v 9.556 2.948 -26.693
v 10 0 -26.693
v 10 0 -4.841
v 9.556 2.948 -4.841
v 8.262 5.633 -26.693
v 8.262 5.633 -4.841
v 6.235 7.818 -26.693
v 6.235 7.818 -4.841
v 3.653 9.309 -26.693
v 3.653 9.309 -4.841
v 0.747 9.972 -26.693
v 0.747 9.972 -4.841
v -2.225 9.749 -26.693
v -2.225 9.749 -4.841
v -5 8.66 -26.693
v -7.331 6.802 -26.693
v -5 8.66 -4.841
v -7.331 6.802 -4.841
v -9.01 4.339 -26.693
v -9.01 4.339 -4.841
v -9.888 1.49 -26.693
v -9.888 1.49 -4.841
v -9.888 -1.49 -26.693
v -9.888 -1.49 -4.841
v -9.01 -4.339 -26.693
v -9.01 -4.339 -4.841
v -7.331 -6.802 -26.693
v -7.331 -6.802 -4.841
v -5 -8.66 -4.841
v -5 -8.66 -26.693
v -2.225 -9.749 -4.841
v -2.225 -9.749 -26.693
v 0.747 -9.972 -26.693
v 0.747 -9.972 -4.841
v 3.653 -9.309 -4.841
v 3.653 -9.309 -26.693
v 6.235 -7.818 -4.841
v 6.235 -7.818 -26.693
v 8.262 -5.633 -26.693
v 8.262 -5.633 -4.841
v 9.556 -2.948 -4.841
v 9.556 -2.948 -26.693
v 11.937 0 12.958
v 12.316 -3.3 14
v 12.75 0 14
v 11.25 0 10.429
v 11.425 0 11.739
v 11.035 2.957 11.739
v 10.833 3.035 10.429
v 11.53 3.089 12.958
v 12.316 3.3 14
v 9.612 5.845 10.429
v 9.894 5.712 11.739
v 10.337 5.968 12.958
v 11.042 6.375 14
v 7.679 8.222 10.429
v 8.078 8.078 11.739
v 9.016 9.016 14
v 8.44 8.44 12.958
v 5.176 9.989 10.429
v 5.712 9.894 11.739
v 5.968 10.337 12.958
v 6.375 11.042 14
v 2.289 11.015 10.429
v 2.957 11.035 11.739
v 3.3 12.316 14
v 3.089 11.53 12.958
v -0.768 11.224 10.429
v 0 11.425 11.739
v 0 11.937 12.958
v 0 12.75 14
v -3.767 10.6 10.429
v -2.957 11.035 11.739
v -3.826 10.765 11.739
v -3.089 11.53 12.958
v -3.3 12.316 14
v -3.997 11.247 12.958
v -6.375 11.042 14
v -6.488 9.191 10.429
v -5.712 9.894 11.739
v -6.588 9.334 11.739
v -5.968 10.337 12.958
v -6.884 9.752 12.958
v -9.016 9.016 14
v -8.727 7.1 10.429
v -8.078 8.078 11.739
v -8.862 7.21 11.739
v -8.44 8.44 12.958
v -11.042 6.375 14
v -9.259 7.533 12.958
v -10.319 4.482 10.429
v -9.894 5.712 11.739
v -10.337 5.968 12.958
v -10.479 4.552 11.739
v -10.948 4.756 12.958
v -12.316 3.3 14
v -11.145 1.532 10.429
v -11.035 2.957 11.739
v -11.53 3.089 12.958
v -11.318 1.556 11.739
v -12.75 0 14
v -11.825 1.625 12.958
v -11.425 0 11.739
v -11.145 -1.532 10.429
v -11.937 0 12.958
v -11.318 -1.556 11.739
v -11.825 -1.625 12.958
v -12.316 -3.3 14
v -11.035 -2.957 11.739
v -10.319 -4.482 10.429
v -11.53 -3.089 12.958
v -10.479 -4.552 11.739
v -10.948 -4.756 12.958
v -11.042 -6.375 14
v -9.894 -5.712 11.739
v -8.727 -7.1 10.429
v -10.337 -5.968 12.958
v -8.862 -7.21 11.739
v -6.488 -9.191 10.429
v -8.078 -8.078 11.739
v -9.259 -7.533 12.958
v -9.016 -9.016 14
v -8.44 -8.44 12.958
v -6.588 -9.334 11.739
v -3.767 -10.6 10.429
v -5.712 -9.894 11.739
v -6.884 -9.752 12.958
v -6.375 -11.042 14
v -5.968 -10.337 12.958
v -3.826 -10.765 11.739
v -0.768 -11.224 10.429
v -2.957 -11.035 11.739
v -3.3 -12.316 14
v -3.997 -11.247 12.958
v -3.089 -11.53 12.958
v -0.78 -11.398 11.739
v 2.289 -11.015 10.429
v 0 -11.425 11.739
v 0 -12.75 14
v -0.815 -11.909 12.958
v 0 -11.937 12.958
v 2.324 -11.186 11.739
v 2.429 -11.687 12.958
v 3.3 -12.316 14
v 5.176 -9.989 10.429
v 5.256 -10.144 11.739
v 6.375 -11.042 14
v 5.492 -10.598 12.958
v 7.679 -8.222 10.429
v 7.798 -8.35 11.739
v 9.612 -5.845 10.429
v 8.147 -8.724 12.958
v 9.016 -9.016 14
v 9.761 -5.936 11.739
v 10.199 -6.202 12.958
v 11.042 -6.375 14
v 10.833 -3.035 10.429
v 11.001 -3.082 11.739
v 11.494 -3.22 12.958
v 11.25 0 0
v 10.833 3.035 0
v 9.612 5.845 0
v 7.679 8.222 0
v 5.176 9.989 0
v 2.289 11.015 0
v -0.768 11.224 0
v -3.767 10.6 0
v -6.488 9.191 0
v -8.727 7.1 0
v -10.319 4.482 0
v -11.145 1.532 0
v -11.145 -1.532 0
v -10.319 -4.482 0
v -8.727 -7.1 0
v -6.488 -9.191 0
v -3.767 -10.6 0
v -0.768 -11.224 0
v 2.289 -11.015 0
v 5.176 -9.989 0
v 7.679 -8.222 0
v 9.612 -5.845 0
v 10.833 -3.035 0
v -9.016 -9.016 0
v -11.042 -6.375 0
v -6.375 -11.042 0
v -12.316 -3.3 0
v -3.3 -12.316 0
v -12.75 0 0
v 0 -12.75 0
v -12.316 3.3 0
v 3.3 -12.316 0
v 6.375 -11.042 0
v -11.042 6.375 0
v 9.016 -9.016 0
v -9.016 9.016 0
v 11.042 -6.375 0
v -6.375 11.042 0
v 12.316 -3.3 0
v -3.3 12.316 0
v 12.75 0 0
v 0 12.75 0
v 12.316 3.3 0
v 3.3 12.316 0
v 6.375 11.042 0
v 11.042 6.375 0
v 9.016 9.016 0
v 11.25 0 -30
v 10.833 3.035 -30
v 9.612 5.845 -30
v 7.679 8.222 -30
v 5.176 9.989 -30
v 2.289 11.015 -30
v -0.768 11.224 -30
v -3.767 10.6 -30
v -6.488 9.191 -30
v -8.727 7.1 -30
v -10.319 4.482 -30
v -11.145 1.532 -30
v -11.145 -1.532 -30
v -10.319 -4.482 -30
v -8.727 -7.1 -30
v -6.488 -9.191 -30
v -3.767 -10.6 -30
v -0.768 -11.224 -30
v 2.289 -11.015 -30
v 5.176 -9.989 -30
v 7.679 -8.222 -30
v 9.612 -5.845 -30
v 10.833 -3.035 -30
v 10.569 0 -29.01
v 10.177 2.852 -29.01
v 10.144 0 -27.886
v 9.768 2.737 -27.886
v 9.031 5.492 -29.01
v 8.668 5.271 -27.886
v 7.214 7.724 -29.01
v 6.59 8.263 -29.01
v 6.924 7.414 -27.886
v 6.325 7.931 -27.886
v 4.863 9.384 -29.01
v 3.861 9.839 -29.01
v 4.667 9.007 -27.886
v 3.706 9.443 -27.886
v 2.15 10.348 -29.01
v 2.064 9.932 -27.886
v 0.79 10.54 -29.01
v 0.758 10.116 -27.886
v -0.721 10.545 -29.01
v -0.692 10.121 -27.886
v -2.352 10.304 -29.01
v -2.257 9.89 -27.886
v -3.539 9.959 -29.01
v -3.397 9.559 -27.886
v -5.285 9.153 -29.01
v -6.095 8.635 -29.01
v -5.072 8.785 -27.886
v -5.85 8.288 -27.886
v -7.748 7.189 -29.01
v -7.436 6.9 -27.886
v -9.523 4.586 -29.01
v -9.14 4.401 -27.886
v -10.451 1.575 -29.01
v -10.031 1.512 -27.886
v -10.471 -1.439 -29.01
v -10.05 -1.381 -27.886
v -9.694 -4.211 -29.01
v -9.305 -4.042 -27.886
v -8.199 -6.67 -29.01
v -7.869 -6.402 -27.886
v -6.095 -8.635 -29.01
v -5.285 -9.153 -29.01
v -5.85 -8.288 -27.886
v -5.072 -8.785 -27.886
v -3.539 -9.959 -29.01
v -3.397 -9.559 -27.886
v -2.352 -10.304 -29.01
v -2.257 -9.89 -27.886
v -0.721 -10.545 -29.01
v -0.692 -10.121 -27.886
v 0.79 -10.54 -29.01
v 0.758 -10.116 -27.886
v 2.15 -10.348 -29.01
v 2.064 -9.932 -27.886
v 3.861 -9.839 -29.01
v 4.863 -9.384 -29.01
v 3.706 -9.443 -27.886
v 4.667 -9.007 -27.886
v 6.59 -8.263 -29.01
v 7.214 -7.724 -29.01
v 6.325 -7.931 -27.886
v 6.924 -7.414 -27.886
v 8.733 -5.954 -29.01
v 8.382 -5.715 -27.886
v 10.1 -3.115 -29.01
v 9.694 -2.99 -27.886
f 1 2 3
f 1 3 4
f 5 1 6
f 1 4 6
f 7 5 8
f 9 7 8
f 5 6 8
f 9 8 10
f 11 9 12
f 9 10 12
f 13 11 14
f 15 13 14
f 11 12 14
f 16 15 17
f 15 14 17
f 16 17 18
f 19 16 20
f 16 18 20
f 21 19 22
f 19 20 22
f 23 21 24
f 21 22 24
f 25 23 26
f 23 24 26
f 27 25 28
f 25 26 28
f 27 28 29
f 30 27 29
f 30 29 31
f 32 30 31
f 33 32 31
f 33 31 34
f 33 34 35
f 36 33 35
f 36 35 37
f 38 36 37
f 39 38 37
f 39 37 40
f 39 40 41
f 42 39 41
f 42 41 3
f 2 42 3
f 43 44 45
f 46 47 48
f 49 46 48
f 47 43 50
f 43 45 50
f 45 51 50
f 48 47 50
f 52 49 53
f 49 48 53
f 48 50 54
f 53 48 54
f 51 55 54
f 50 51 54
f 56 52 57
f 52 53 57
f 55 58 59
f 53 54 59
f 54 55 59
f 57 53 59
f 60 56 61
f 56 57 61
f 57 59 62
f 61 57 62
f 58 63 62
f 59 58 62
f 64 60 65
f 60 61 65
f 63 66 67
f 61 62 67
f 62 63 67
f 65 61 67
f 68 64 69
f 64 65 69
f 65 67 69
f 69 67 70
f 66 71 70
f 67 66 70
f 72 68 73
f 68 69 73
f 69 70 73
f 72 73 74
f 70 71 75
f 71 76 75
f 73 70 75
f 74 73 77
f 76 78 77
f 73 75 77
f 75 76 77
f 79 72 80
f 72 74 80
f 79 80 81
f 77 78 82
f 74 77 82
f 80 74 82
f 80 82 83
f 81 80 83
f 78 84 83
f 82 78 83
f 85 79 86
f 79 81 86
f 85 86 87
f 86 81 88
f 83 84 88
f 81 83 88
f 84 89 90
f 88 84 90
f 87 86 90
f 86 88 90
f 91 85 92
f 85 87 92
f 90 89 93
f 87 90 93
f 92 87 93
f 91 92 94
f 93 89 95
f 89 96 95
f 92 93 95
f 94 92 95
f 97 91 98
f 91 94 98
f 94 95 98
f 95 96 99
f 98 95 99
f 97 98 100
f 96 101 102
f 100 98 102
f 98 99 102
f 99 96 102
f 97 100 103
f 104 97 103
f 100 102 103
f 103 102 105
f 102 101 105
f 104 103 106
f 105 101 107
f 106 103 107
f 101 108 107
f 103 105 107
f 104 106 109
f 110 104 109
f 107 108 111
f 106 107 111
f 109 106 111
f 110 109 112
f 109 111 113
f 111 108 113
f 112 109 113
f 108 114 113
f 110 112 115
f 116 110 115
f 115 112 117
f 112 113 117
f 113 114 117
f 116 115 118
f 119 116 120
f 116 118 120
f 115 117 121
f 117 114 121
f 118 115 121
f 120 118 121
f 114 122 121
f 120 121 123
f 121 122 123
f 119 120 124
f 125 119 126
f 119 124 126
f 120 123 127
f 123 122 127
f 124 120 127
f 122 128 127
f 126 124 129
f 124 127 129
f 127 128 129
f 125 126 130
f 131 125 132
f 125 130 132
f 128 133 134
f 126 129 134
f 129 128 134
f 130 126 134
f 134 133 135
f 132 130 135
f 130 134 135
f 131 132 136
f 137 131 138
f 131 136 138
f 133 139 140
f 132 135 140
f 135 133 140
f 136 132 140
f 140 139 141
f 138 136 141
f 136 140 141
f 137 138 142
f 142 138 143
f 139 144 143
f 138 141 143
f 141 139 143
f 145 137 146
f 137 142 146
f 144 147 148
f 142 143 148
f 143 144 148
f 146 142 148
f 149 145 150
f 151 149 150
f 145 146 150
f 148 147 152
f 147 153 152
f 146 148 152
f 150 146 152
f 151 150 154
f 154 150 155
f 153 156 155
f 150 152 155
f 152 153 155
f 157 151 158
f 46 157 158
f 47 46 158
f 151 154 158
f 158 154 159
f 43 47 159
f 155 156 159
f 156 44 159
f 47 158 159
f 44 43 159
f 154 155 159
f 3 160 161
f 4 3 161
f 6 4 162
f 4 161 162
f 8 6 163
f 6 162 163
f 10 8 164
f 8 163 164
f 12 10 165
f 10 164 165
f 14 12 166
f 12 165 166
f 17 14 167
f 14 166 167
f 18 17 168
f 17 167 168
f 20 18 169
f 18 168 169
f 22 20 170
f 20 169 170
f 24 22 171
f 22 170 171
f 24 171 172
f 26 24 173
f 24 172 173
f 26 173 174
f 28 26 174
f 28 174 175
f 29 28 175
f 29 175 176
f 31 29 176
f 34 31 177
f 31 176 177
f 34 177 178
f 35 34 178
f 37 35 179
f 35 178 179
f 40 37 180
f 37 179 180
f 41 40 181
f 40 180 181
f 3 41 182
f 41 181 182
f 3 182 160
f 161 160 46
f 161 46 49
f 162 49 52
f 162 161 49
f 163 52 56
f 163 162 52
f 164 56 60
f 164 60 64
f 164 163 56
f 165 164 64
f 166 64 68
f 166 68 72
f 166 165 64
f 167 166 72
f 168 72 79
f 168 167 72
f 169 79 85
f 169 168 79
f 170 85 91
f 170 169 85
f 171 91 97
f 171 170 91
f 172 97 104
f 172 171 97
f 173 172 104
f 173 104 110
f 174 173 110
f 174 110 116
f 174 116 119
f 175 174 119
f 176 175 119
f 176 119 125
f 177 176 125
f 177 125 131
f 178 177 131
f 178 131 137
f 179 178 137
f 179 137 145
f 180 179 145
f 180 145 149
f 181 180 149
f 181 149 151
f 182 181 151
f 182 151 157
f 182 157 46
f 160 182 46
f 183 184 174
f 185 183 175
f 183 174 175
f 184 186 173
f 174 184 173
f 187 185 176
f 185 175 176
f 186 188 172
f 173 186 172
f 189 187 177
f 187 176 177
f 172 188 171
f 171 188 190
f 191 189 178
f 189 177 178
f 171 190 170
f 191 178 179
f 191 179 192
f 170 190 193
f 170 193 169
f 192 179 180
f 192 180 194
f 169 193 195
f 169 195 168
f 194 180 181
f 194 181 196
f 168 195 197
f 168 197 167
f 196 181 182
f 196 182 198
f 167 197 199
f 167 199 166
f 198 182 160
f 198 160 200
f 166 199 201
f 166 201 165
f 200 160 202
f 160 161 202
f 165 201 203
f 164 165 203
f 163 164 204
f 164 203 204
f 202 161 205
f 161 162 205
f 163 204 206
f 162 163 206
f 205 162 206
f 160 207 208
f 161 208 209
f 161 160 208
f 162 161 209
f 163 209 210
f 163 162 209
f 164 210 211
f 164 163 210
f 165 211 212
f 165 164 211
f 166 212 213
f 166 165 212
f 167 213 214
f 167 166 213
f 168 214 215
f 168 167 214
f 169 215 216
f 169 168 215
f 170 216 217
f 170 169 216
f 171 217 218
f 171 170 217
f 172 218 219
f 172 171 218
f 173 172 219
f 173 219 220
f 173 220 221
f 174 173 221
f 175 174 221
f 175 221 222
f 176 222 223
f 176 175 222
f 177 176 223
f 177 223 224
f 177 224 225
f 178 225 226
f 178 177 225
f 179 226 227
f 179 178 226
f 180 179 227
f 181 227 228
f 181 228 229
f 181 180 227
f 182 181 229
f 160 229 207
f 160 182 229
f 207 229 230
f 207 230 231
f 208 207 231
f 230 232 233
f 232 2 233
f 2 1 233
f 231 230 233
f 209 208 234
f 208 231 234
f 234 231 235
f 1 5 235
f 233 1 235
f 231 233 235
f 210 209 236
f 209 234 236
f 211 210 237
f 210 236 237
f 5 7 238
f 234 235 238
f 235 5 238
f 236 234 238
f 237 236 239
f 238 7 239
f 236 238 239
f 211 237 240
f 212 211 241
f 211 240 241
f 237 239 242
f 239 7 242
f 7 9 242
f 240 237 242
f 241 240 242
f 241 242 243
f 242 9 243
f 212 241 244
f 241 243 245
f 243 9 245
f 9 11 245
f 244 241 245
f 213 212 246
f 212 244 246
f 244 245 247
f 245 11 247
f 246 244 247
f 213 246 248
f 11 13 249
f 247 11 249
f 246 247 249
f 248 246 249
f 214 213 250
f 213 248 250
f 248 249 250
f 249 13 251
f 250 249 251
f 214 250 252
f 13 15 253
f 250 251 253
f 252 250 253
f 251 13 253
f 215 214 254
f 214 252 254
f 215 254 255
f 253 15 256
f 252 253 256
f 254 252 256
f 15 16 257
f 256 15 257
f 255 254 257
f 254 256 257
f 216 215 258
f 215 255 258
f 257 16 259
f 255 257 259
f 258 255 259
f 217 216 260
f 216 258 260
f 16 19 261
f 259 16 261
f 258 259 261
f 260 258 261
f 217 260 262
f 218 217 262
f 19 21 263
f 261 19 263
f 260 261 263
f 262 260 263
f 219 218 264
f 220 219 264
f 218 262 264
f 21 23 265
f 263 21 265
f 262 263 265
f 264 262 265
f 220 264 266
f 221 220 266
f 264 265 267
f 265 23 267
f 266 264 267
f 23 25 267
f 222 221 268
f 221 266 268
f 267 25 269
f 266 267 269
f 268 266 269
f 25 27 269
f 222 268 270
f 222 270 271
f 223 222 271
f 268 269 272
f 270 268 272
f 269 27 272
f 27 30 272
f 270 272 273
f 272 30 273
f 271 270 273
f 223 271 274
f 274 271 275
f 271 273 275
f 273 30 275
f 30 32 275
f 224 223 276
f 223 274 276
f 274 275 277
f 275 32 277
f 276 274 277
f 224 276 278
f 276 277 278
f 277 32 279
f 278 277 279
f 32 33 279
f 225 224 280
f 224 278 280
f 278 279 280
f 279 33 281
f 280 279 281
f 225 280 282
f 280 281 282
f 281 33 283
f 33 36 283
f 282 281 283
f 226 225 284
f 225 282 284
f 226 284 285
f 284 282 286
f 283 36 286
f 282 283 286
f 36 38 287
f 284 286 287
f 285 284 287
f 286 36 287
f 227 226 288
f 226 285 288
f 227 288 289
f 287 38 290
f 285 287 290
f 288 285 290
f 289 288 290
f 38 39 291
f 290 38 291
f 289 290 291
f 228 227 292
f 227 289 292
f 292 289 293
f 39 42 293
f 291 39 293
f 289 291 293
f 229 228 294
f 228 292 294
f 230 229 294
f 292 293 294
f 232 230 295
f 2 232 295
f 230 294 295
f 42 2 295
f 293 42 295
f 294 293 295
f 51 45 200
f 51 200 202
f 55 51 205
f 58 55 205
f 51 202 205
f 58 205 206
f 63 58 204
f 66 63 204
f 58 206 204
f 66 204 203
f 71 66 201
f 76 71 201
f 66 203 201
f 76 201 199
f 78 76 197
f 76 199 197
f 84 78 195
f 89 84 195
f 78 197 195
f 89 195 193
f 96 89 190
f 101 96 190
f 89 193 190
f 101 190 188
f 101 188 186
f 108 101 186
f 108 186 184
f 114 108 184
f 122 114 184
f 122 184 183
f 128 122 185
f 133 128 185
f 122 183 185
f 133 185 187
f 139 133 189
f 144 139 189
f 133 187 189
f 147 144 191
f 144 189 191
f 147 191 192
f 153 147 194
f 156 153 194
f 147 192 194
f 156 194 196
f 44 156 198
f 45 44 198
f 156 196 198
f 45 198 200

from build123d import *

# Parameters (mm, degrees)
F0_R     = 12.75
F0_R_2   = 11.25
F1_DEPTH = 14
F2_R     = 11.25
F2_R_2   = 10
F3_DEPTH = 30


# Not quite as in the source:
# - a fillet or chamfer that OpenCascade refuses, or shapes differently, is made with other operations: its cross-section is extruded or revolved along the edge and cut away or added


with BuildPart() as f1:
    # F0 (on Top) → F1 (new body)
    with BuildSketch(Plane.XY):
        Circle(F0_R)
        Circle(F0_R_2, mode=Mode.SUBTRACT)
    extrude(amount=F1_DEPTH)

    # F5: fillet of radius 5 on 1 edges, made by hand

    # F5_s1 → F5_t2 (revolve, cut)
    with BuildSketch(Plane.XZ):
        with BuildLine():
            ThreePointArc((11.25, 10.4292857857), (11.6402277714, 12.3657774588), (12.75, 14))
            Line((12.75, 14), (11.25, 14))
            Line((11.25, 14), (11.25, 10.4292857857))
        make_face()
    revolve(axis=Axis((0, 0, 14), (0, 0, 1)), mode=Mode.SUBTRACT)


with BuildPart() as f3:
    # F2 (on Top) → F3 (new body)
    with BuildSketch(Plane.XY):
        Circle(F2_R)
        Circle(F2_R_2, mode=Mode.SUBTRACT)
    extrude(amount=-F3_DEPTH)

    # F4: fillet of radius 10 on 1 edges, made by hand

    # F4_s1 → F4_t2 (revolve, cut)
    with BuildSketch(Plane.XZ):
        with BuildLine():
            add(Edge.make_bspline(
                [(10, -4.8412291828), (10, -2.2592402853), (11.25, 0)],
                knots=[0, 0, 0, 1, 1, 1], degree=2, weights=[1, 0.1111111111, 1]))
            Line((11.25, 0), (10, 0))
            Line((10, 0), (10, -4.8412291828))
        make_face()
    revolve(axis=Axis((0, 0, 0), (0, 0, 1)), mode=Mode.SUBTRACT)

    # F6: fillet of radius 5 on 1 edges, made by hand

    # F6_s1 → F6_t2 (revolve, cut)
    with BuildSketch(Plane.XZ):
        with BuildLine():
            ThreePointArc((11.25, -30), (10.3229282665, -28.4605778141), (10, -26.6928108612))
            Line((10, -26.6928108612), (10, -30))
            Line((10, -30), (11.25, -30))
        make_face()
    revolve(axis=Axis((0, 0, -30), (0, 0, 1)), mode=Mode.SUBTRACT)


solid = Compound([f1.part, f3.part])
